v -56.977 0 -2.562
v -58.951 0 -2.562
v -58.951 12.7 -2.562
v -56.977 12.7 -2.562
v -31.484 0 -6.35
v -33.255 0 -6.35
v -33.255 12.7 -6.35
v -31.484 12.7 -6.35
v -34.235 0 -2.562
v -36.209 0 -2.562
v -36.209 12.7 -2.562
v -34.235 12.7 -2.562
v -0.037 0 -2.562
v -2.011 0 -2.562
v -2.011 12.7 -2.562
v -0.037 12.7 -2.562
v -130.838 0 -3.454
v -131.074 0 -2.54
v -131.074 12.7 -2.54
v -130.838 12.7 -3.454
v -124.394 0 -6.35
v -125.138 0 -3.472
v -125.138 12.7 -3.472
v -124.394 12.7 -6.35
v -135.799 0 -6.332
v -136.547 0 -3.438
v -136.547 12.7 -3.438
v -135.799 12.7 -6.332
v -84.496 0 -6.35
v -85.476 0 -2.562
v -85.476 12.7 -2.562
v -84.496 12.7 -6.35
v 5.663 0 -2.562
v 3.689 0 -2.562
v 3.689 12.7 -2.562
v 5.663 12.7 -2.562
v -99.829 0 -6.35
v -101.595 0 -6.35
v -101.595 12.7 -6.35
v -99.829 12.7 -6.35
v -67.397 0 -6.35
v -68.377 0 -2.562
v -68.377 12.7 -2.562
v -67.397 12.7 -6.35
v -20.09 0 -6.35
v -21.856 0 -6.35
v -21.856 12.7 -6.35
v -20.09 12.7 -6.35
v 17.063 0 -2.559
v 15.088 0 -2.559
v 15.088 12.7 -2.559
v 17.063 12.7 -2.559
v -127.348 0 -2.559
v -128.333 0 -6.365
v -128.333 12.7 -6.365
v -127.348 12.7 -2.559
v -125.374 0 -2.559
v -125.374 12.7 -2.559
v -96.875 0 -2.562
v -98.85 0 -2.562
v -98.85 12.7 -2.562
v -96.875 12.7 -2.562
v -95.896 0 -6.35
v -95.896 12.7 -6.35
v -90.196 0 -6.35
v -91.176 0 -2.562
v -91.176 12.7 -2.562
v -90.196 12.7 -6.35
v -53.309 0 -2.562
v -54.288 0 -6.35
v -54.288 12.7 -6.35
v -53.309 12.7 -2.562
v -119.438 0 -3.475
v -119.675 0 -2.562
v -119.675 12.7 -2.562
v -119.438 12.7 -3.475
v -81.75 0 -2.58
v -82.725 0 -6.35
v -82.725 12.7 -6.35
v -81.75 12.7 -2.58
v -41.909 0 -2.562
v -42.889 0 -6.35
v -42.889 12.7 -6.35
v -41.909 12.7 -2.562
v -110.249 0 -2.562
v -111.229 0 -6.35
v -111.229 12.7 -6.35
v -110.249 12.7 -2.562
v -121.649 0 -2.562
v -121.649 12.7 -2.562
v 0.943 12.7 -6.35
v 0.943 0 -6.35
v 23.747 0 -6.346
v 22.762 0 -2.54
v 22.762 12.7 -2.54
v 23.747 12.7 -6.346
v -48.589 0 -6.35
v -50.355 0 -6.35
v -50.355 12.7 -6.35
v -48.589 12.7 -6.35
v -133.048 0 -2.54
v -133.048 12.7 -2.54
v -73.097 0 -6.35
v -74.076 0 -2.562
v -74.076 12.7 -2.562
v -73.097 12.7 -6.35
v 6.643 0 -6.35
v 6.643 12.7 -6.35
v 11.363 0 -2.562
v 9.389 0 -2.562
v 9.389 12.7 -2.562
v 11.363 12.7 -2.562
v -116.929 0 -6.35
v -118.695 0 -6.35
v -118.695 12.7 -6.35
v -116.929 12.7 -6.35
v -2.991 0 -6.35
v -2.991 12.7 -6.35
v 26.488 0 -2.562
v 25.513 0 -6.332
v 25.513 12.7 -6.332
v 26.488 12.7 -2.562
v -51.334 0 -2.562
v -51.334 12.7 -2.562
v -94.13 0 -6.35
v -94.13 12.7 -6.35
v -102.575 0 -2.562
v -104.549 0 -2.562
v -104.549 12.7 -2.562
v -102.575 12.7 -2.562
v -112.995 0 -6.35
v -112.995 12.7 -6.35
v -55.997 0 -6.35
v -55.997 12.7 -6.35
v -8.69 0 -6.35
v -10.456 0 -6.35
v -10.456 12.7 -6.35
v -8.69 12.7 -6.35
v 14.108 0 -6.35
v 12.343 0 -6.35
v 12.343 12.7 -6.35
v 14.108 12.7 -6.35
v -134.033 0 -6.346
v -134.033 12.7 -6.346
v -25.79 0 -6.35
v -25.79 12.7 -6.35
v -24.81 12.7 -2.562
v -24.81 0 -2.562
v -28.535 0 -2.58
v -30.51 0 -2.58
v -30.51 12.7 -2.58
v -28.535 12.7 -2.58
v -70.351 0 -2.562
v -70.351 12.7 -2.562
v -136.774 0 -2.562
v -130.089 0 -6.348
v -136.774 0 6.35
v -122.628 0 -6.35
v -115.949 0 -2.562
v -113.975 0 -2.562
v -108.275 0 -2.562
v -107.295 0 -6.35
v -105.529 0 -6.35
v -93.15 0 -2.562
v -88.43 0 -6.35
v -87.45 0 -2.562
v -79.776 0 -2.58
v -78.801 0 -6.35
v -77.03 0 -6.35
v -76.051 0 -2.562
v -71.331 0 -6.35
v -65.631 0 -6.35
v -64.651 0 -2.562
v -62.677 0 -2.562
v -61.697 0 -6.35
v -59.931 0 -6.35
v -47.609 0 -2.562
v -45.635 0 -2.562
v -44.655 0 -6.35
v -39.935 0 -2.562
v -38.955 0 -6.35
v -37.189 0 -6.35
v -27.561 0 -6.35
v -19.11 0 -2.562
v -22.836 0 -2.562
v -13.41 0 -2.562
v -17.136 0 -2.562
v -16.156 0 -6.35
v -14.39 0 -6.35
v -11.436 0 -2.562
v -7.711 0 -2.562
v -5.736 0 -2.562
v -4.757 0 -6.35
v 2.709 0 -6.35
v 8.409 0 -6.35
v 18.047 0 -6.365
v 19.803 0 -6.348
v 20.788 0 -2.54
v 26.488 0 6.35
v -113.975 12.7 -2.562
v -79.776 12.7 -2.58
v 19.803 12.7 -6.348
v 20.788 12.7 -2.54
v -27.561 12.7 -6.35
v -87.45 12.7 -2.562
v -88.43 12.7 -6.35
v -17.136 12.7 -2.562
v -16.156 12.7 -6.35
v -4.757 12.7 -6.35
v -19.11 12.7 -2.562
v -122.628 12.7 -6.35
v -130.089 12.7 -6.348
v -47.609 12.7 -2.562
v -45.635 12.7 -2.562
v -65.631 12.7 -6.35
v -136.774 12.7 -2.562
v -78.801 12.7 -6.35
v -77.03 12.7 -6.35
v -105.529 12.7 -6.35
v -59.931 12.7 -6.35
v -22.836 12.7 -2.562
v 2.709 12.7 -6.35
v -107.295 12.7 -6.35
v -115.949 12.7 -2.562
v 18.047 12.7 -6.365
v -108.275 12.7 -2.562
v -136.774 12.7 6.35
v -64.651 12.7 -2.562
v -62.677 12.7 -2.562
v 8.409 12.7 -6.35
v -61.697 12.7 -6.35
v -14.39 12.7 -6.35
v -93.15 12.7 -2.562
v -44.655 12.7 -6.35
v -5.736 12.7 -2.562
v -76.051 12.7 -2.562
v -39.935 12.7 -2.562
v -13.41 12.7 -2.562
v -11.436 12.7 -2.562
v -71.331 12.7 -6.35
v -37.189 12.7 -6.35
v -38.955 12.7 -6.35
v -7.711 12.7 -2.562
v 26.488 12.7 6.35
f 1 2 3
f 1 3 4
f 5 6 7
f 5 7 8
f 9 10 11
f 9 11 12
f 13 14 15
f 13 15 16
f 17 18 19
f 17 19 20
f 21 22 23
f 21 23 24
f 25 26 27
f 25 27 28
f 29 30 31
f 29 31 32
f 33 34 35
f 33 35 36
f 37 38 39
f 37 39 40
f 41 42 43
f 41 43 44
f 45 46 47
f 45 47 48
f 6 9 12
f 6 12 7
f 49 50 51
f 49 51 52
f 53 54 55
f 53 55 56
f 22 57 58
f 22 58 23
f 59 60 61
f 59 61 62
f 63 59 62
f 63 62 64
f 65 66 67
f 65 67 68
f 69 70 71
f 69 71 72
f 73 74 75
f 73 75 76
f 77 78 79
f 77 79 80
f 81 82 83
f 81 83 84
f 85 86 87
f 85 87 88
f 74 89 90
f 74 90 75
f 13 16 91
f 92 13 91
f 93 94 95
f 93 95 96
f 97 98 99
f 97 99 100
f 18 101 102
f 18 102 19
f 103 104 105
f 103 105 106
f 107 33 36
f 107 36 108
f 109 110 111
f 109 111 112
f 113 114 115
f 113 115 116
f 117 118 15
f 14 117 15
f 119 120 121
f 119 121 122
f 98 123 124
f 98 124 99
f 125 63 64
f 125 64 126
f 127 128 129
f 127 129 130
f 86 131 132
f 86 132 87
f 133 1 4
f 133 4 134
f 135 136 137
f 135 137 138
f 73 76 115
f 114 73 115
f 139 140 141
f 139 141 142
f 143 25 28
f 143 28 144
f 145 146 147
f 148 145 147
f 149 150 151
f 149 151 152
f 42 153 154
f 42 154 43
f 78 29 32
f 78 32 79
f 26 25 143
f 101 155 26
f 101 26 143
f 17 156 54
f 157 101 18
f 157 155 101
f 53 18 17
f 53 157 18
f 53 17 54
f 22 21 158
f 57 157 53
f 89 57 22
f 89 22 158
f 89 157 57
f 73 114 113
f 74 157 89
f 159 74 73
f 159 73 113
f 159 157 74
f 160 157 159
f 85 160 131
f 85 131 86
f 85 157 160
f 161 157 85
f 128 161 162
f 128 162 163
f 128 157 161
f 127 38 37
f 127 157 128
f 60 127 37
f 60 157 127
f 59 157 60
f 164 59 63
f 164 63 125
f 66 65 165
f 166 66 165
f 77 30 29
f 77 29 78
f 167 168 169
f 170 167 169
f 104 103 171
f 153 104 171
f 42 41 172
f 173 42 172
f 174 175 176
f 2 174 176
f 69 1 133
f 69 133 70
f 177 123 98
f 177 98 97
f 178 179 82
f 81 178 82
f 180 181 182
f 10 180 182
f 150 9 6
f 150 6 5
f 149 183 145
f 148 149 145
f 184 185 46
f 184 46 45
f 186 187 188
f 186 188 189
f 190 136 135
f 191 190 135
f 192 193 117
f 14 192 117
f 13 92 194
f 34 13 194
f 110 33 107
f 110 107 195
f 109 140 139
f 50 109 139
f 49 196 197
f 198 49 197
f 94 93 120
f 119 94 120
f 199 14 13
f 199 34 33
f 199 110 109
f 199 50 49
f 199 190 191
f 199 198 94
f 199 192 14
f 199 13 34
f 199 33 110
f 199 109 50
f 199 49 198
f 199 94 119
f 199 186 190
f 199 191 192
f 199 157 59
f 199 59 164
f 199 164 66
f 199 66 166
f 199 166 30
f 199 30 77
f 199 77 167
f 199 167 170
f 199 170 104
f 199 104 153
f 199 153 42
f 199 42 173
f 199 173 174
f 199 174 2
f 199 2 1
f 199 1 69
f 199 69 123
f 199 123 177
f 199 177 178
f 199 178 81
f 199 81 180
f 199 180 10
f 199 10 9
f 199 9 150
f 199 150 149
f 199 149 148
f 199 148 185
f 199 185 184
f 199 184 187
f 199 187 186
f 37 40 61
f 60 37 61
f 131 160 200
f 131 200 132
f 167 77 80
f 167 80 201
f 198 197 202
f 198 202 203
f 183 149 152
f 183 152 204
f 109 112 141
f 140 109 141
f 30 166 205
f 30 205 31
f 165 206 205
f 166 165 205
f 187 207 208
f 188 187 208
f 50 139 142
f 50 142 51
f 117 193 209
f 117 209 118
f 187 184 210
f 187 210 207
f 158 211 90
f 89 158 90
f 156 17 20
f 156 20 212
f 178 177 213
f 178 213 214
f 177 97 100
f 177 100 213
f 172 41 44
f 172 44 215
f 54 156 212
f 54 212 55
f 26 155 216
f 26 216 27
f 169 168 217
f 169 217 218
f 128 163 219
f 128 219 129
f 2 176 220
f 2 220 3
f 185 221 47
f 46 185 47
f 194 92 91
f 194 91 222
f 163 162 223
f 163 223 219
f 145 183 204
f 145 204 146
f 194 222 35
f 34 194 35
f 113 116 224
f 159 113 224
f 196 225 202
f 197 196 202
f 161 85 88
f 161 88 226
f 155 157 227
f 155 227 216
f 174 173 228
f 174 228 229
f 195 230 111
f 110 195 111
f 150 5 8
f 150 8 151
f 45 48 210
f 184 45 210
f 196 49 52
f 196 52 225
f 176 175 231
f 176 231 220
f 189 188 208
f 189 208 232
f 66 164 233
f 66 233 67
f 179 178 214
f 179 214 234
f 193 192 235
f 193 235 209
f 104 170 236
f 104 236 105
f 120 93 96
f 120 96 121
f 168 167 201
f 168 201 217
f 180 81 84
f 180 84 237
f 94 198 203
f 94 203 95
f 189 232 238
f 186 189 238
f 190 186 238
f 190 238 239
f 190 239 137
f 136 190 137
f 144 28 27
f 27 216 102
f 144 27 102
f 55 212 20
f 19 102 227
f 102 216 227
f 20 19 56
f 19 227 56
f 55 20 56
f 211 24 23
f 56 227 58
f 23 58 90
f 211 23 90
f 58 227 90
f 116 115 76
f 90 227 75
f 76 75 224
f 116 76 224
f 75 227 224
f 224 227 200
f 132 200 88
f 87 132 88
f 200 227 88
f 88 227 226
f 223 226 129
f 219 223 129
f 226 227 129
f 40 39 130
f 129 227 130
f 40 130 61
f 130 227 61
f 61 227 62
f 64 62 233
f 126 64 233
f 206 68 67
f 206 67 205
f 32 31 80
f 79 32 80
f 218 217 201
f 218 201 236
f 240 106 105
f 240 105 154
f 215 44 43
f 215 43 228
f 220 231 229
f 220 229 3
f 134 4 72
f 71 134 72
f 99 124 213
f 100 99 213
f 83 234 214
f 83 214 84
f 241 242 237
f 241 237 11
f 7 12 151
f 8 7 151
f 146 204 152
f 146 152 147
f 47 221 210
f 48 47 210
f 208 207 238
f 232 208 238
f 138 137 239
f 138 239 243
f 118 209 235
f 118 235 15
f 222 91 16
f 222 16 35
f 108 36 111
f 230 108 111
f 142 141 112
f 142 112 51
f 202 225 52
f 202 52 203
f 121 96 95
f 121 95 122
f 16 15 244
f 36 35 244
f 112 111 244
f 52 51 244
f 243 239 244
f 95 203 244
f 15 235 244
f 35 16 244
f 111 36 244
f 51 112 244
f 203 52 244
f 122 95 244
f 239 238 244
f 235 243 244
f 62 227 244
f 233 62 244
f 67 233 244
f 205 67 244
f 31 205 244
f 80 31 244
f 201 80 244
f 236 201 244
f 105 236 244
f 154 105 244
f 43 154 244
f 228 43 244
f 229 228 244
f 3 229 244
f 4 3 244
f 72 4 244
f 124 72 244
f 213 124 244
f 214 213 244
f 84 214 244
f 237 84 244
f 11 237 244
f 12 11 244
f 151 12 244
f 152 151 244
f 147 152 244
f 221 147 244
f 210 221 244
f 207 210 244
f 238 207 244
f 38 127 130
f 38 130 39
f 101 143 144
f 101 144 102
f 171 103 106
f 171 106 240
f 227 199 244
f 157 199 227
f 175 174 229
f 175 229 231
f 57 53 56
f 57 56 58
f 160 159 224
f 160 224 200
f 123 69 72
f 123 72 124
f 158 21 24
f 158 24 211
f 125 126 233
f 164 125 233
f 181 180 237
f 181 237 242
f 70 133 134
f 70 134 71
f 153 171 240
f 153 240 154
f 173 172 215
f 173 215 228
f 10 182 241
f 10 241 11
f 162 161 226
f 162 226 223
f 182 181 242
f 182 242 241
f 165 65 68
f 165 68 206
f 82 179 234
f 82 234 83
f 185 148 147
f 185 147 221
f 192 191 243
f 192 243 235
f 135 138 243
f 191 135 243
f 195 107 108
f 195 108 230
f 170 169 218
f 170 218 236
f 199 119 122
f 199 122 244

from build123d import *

# Parameters (mm, degrees)
F1_DEPTH = 12.7


# Not quite as in the source:
# - a feature of the source that left no trace in its solid (it failed there, or was rolled back) is left out


with BuildPart() as f1:
    # F0 (on Front) → F1 (new body)
    with BuildSketch(Plane.XZ):
        Polygon((26.4879943687, -2.5616034378), (26.4879943687, 6.35), (-136.7738045981, 6.35), (-136.7738045981, -2.5616034378), (-136.5471367316, -3.4380630457), (-135.7986113058, -6.3323961114), (-134.0326395944, -6.346404838), (-133.0482363701, -2.54), (-131.0740445981, -2.54), (-130.837778613, -3.4535727787), (-130.0892531872, -6.3479058444), (-128.3328795944, -6.3651881602), (-127.3484763701, -2.5587833222), (-125.3742845981, -2.5587833222), (-125.138018613, -3.4723561009), (-124.3938092991, -6.35), (-122.9682044968, -6.35), (-122.6284623376, -6.35), (-121.6487163701, -2.5616034378), (-119.6745245981, -2.5616034378), (-119.438258613, -3.4751762165), (-118.6947786306, -6.35), (-117.8373619914, -6.35), (-117.2674353611, -6.35), (-116.9287023376, -6.35), (-115.9489563701, -2.5616034378), (-113.9747645981, -2.5616034378), (-112.9950186306, -6.35), (-112.1405051147, -6.35), (-111.2289423376, -6.35), (-110.2491963701, -2.5616034378), (-108.2750045981, -2.5616034378), (-107.2952586306, -6.35), (-106.4407451147, -6.35), (-105.5291823376, -6.35), (-104.5494363701, -2.5616034378), (-102.5752445981, -2.5616034378), (-101.5954986306, -6.35), (-100.7409851147, -6.35), (-99.8294223376, -6.35), (-98.8496763701, -2.5616034378), (-96.8754845981, -2.5616034378), (-95.8957386306, -6.35), (-95.0412251147, -6.35), (-94.1296623376, -6.35), (-93.1499163701, -2.5616034378), (-91.1757245981, -2.5616034378), (-90.1959786306, -6.35), (-89.3414651147, -6.35), (-88.4299023376, -6.35), (-87.4501563701, -2.5616034378), (-85.4759645981, -2.5616034378), (-84.4962186306, -6.35), (-82.7252846402, -6.35), (-81.7503963701, -2.58038676), (-79.7762045981, -2.58038676), (-78.801316328, -6.35), (-77.9419451147, -6.35), (-77.0303823376, -6.35), (-76.0506363701, -2.5616034378), (-74.0764445981, -2.5616034378), (-73.0966986306, -6.35), (-72.2421851147, -6.35), (-71.3306223376, -6.35), (-70.3508763701, -2.5616034378), (-68.3766845981, -2.5616034378), (-67.3969386306, -6.35), (-66.5424251147, -6.35), (-65.6308623376, -6.35), (-64.6511163701, -2.5616034378), (-62.6769245981, -2.5616034378), (-61.6971786306, -6.35), (-60.8426651147, -6.35), (-59.9311023376, -6.35), (-58.9513563701, -2.5616034378), (-56.9771645981, -2.5616034378), (-55.9974186306, -6.35), (-54.2883915989, -6.35), (-53.3086456314, -2.5616034378), (-53.2515963701, -2.5616034378), (-51.3344538594, -2.5616034378), (-50.3547078919, -6.35), (-49.4431451147, -6.35), (-48.5886315989, -6.35), (-47.6088856314, -2.5616034378), (-45.6346938594, -2.5616034378), (-44.6549478919, -6.35), (-43.7433851147, -6.35), (-42.8888715989, -6.35), (-41.9091256314, -2.5616034378), (-39.9349338594, -2.5616034378), (-38.9551878919, -6.35), (-38.0436251147, -6.35), (-37.1891115989, -6.35), (-36.2093656314, -2.5616034378), (-34.2351738594, -2.5616034378), (-33.2554278919, -6.35), (-32.3438651147, -6.35), (-31.4844939015, -6.35), (-30.5096056314, -2.58038676), (-28.5354138594, -2.58038676), (-27.5605255893, -6.35), (-25.7895915989, -6.35), (-24.8098456314, -2.5616034378), (-22.8356538594, -2.5616034378), (-21.8559078919, -6.35), (-20.9443451147, -6.35), (-20.0898315989, -6.35), (-19.1100856314, -2.5616034378), (-17.1358938594, -2.5616034378), (-16.1561478919, -6.35), (-15.2445851147, -6.35), (-14.3900715989, -6.35), (-13.4103256314, -2.5616034378), (-11.4361338594, -2.5616034378), (-10.4563878919, -6.35), (-9.5448251147, -6.35), (-8.6903115989, -6.35), (-7.7105656314, -2.5616034378), (-5.7363738594, -2.5616034378), (-4.7566278919, -6.35), (-3.8450651147, -6.35), (-2.9905515989, -6.35), (-2.0108056314, -2.5616034378), (-0.0366138594, -2.5616034378), (0.9431321081, -6.35), (1.8546948853, -6.35), (2.7092084011, -6.35), (3.6889543686, -2.5616034378), (5.6631461406, -2.5616034378), (6.6428921081, -6.35), (8.4089684011, -6.35), (9.3887143686, -2.5616034378), (11.3629061406, -2.5616034378), (12.3426521081, -6.35), (14.1079990696, -6.35), (15.0884743686, -2.5587833222), (17.0626661406, -2.5587833222), (18.0470693649, -6.3651881602), (19.8034429577, -6.3479058444), (20.7882343686, -2.54), (22.7624261406, -2.54), (23.7468293649, -6.346404838), (25.5128010763, -6.3323961114), align=None)
    extrude(amount=-F1_DEPTH)


solid = f1.part
